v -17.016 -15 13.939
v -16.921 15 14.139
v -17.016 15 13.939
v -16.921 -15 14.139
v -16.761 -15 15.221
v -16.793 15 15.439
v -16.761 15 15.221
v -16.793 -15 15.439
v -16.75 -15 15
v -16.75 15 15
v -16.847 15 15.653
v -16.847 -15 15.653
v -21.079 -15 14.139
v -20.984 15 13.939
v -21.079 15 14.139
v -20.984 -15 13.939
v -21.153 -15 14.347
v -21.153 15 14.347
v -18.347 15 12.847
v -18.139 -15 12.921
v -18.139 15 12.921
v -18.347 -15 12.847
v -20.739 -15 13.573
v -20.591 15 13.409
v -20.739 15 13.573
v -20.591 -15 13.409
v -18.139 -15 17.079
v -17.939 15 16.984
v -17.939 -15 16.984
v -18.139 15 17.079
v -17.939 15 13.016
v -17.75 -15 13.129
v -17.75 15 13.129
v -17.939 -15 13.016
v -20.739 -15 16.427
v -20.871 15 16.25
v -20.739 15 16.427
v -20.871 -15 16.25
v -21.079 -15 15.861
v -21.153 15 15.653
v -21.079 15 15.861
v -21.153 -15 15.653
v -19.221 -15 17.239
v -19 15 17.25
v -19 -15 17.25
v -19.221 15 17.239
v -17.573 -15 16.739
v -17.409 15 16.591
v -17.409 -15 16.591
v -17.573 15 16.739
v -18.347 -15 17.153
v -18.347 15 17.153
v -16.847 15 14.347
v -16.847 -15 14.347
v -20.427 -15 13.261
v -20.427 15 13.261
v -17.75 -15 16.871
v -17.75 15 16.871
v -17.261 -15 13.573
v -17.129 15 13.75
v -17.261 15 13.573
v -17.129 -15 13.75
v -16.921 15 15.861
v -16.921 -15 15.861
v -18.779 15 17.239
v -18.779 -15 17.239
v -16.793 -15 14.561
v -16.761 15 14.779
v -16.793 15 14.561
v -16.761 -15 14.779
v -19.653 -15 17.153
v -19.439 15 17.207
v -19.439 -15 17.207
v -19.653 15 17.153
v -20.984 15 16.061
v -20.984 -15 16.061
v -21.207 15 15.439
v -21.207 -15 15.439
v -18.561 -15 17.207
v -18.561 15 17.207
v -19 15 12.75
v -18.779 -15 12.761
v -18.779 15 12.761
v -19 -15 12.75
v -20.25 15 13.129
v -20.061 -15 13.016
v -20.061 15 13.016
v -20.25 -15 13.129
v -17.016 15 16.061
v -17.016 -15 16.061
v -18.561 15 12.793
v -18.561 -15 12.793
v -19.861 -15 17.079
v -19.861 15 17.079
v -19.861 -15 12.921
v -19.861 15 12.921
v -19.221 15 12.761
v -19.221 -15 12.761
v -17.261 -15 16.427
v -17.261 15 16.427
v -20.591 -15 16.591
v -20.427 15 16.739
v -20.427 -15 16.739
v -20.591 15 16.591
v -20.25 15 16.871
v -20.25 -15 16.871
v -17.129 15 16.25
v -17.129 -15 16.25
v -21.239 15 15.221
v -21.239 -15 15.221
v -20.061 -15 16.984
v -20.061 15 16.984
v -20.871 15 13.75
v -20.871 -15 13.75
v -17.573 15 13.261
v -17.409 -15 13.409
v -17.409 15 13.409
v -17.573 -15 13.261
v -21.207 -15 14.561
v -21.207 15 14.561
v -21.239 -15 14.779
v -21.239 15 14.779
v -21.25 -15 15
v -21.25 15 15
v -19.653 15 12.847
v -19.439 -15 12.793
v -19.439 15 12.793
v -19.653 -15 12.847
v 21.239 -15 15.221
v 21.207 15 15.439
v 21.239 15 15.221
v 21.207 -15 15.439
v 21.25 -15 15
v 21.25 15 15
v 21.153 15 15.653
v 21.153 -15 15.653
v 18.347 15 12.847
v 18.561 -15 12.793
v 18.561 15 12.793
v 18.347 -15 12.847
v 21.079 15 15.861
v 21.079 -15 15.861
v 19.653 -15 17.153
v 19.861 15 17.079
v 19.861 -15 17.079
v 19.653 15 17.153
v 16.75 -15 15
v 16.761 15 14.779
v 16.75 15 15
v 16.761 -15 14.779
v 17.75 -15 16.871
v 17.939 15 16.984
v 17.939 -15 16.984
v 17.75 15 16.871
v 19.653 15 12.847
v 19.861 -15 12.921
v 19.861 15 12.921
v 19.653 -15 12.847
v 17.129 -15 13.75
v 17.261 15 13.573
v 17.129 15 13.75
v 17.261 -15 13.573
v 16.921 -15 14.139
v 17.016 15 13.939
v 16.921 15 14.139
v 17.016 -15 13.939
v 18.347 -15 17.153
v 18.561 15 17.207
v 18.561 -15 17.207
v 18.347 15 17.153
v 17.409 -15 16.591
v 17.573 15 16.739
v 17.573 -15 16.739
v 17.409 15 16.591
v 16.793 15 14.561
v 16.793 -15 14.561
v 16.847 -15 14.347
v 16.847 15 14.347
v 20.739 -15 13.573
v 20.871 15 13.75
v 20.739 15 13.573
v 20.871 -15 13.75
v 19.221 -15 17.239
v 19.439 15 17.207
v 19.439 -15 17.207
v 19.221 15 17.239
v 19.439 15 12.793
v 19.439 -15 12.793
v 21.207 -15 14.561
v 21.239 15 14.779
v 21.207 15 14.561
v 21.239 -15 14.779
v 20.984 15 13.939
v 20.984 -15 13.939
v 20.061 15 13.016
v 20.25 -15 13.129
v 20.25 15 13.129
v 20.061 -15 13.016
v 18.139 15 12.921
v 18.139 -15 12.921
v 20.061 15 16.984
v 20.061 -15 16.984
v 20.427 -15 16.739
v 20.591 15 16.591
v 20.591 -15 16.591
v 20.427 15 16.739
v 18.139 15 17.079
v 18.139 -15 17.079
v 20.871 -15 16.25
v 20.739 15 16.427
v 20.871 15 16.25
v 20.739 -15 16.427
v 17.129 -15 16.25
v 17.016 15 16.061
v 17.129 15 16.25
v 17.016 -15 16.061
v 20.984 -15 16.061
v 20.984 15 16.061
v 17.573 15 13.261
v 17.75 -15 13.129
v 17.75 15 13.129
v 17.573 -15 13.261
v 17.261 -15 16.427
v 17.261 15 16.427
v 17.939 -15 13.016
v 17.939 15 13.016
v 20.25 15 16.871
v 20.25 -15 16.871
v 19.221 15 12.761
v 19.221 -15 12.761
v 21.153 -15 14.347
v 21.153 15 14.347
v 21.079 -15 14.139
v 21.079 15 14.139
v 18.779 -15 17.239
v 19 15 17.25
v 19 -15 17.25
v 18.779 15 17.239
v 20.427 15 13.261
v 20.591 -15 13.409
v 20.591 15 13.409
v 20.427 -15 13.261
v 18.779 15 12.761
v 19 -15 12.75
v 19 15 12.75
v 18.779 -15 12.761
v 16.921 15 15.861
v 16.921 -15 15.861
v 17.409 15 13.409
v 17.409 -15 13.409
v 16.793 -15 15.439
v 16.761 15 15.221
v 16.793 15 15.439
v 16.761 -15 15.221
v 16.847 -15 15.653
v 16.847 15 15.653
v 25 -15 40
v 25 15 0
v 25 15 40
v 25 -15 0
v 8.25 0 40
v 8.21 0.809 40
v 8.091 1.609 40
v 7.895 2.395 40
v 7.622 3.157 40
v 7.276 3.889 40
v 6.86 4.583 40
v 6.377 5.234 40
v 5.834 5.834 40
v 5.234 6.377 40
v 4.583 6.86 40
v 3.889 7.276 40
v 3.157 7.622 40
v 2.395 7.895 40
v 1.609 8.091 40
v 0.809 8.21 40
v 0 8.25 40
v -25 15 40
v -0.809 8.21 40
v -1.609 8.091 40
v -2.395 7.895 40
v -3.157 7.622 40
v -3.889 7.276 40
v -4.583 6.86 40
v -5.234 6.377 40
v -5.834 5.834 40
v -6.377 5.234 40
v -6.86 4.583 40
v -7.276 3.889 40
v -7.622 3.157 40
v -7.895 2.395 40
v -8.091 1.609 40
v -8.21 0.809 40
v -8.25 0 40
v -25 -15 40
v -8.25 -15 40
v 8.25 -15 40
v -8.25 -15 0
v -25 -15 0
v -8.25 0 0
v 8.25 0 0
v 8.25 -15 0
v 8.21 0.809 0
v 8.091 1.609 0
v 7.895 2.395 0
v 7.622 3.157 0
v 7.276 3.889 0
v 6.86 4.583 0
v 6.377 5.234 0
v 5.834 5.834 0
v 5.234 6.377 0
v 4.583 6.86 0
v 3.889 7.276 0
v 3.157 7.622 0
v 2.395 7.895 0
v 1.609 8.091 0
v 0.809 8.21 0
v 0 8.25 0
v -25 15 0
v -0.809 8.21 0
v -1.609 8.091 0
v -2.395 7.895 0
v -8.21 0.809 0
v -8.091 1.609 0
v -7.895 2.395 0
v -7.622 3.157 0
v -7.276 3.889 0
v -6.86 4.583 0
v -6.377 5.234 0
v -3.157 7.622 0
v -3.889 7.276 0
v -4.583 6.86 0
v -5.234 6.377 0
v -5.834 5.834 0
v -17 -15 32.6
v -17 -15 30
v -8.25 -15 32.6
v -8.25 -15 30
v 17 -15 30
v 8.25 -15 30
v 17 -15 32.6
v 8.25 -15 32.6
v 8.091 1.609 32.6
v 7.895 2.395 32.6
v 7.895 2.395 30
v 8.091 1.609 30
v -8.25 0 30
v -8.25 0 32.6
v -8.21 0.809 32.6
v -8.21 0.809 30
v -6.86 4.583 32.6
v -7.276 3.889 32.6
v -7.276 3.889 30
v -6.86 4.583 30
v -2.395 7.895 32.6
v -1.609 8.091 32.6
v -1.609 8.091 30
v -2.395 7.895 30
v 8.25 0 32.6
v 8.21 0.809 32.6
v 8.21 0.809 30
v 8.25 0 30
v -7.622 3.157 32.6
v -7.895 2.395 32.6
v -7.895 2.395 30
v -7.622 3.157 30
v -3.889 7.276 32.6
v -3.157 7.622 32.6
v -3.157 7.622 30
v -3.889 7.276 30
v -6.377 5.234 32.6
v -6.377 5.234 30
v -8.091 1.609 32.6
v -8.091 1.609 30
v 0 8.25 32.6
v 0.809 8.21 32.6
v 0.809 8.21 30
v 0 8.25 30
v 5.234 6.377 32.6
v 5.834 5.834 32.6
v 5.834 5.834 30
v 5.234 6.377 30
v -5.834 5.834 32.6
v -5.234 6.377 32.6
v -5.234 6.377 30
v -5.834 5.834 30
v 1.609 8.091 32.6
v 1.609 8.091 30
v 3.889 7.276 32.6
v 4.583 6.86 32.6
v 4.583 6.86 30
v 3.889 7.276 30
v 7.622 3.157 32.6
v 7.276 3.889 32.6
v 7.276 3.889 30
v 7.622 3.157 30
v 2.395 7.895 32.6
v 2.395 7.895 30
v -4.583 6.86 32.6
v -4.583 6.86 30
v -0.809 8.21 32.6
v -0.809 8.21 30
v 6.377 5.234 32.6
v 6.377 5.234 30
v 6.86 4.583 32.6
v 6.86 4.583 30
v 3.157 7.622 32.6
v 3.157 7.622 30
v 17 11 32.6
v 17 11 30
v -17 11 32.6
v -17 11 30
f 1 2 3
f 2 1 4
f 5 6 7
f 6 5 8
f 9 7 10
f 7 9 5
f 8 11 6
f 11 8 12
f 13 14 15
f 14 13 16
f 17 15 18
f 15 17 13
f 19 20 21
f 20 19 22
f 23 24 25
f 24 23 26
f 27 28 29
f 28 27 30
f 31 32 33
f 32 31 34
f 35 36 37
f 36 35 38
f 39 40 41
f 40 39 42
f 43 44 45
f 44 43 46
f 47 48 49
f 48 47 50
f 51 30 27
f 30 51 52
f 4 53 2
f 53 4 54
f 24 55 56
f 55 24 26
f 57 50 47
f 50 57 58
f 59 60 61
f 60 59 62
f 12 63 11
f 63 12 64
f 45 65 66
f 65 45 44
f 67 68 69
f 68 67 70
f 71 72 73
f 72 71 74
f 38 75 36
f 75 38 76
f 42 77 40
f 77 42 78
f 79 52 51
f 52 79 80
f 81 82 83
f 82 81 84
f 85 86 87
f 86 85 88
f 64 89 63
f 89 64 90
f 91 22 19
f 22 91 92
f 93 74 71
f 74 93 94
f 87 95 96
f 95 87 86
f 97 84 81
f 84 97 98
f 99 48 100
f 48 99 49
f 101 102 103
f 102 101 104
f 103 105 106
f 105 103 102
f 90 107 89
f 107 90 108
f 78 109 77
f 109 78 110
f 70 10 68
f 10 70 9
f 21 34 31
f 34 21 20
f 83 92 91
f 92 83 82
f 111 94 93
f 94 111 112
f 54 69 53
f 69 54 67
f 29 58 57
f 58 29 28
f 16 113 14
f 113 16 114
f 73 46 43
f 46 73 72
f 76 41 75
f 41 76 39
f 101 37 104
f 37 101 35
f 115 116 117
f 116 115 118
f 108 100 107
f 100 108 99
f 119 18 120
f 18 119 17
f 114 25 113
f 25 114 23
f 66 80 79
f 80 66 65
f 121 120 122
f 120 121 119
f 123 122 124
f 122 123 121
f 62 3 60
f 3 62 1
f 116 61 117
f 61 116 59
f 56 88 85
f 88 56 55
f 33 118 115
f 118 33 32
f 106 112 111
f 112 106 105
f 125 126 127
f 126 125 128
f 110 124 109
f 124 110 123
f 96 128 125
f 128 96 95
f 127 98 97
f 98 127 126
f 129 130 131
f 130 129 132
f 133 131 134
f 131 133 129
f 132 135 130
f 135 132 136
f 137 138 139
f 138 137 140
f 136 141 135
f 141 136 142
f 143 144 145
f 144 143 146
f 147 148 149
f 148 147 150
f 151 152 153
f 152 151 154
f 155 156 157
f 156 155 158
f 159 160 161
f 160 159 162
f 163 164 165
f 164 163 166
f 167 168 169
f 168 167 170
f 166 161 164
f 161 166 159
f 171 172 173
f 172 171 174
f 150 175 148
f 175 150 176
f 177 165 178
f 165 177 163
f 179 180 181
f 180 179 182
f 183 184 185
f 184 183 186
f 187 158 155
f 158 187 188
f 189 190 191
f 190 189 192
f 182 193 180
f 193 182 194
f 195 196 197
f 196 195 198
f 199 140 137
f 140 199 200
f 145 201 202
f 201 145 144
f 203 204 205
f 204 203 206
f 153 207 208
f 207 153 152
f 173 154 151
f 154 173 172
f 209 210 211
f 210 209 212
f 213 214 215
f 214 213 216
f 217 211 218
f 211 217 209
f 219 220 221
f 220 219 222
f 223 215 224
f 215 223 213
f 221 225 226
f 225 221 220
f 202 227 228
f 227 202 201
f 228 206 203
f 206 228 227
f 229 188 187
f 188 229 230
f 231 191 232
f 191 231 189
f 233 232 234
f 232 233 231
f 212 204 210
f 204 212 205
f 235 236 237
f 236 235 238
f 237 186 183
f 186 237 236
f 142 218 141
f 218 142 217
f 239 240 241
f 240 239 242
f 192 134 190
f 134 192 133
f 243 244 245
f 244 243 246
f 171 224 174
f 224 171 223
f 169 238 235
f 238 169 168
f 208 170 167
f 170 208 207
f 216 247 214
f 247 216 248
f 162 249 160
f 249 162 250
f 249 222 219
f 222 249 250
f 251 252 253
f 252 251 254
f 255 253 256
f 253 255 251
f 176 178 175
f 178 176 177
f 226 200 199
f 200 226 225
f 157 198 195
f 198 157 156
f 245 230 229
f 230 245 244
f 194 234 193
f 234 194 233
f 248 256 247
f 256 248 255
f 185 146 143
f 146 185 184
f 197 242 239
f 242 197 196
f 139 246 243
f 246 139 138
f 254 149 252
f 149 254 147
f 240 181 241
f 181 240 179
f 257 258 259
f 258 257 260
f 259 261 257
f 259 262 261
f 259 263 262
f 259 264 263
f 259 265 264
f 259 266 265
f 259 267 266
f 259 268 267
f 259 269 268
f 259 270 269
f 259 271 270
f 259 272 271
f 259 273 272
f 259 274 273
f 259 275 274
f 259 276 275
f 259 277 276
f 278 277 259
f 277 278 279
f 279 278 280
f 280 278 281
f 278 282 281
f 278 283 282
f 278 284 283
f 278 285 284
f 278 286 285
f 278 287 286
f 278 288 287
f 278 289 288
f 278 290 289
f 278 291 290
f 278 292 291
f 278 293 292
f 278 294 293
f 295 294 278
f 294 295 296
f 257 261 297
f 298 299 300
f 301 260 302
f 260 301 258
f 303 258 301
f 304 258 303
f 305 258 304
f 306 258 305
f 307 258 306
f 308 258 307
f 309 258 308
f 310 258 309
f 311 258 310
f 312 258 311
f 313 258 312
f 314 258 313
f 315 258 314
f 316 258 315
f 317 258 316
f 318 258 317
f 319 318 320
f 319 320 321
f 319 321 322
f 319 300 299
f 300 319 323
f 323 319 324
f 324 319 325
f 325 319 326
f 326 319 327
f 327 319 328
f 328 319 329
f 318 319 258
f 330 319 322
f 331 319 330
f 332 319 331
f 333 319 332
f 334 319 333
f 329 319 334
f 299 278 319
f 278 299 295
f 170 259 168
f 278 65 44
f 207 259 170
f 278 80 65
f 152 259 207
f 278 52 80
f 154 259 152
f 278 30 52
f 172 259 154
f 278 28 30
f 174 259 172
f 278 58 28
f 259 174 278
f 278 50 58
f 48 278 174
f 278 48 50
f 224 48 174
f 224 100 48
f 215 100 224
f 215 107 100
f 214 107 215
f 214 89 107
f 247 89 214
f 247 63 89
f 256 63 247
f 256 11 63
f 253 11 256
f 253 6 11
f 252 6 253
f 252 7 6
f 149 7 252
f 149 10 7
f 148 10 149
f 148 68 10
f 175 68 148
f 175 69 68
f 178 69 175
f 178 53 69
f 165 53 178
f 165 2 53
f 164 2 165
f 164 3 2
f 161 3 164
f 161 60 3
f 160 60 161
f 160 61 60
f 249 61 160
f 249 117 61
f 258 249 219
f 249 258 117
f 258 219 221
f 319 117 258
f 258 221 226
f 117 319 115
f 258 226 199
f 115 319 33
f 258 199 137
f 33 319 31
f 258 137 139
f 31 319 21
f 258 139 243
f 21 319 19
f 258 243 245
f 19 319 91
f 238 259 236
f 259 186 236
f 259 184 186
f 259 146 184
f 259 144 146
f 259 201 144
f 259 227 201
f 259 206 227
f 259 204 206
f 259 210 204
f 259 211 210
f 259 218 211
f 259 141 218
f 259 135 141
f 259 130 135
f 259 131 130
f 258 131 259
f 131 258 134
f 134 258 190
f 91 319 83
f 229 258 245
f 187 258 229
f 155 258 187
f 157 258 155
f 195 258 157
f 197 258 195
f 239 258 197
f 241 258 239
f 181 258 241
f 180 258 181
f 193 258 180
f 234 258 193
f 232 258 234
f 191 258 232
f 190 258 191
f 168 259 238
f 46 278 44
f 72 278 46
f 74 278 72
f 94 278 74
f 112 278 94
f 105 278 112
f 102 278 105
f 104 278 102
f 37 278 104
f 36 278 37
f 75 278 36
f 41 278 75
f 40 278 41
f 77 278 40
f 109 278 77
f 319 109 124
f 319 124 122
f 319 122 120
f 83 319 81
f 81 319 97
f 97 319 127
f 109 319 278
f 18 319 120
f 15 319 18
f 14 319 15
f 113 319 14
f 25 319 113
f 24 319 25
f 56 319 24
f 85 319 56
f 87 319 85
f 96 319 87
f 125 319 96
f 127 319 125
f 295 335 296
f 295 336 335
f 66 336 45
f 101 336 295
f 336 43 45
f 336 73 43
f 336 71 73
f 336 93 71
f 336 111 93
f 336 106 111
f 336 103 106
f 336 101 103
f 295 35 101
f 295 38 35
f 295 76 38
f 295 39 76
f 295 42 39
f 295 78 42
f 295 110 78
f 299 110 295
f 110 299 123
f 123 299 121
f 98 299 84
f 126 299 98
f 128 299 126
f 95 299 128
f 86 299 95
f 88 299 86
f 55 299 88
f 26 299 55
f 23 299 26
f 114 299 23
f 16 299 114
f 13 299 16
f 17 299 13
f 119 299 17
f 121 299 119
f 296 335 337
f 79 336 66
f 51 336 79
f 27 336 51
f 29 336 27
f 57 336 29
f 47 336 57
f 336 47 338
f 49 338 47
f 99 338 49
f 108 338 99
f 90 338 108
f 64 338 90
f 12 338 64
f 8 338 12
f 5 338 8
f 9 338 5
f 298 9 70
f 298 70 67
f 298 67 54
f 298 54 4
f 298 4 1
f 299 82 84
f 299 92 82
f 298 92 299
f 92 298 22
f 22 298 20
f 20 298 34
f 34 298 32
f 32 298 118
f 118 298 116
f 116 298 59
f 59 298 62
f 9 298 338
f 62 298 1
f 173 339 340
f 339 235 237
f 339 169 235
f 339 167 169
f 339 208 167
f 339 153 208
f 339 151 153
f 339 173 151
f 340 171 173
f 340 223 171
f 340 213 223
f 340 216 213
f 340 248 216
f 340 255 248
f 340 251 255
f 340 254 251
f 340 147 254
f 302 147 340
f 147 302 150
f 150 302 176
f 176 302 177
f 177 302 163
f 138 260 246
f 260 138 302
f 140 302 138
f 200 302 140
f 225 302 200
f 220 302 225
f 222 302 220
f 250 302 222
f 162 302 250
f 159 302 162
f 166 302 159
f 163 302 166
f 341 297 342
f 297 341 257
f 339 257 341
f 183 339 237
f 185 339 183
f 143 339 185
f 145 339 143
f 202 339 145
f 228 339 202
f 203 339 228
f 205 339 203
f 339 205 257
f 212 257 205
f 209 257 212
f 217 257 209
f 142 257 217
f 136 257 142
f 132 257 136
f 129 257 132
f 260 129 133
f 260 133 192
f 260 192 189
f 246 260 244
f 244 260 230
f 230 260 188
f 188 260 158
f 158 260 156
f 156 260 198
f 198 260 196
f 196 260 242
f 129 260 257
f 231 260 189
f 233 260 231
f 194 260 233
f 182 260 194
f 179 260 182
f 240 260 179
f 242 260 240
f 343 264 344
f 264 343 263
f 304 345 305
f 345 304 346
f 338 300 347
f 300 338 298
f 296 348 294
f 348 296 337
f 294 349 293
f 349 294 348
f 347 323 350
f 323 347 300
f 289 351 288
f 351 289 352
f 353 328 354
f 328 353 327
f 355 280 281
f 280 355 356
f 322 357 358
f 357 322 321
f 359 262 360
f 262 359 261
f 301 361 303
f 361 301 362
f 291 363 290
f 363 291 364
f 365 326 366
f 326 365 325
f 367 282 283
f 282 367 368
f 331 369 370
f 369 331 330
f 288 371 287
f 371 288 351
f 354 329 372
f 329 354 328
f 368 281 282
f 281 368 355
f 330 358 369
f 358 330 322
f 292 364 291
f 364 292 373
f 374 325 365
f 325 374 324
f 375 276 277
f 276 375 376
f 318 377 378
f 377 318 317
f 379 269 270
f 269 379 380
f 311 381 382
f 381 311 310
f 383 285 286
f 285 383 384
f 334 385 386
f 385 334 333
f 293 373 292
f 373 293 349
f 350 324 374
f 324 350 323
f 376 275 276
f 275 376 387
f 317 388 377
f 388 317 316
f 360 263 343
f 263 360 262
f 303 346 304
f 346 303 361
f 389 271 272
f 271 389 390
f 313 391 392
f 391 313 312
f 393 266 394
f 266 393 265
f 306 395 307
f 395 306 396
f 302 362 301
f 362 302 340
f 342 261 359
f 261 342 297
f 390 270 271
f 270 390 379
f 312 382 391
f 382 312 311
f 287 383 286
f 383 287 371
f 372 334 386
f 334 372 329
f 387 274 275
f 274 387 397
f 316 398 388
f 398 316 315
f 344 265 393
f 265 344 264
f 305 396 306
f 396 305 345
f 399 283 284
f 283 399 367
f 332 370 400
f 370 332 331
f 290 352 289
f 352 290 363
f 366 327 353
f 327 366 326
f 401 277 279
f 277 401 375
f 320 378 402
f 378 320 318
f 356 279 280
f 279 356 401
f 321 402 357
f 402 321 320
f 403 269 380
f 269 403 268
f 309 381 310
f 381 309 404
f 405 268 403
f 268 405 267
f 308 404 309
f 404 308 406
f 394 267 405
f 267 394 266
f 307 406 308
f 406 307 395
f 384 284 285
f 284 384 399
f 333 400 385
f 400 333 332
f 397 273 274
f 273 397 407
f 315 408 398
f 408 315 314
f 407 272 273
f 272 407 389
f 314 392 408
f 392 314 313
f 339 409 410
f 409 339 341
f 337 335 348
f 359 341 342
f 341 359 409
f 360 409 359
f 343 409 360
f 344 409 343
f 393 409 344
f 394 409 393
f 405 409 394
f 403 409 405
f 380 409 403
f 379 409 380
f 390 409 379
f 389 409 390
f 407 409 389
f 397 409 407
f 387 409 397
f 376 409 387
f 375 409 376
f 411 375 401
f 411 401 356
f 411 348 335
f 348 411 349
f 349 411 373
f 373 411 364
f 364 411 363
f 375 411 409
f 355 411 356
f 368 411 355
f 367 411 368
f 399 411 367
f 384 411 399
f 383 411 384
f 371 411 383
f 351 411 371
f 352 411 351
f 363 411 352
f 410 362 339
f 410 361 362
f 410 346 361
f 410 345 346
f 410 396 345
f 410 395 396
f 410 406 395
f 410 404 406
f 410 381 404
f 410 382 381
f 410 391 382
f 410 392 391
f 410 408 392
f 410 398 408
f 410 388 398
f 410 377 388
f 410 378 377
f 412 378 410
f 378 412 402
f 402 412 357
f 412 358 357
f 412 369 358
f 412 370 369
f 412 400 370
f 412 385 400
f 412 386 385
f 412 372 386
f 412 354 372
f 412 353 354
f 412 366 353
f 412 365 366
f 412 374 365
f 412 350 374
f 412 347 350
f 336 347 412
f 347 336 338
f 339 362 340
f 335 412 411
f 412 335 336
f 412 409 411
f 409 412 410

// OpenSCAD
// KNOWN-RIGHT ALTERNATIVE (must pass): a correct part coded independently, the barrel channel as a hull()
$fn=64;
difference(){ translate([-25,-15,0]) cube([50,30,40]);
 translate([0,0,-1]) hull(){ cylinder(r=8.25,h=42); translate([-8.25,-20,0]) cube([16.5,1,42]); }
 translate([-17,-20,30]) cube([34,31,2.6]);
 for(x=[-19,19]) translate([x,20,15]) rotate([90,0,0]) cylinder(d=4.5,h=40); }
